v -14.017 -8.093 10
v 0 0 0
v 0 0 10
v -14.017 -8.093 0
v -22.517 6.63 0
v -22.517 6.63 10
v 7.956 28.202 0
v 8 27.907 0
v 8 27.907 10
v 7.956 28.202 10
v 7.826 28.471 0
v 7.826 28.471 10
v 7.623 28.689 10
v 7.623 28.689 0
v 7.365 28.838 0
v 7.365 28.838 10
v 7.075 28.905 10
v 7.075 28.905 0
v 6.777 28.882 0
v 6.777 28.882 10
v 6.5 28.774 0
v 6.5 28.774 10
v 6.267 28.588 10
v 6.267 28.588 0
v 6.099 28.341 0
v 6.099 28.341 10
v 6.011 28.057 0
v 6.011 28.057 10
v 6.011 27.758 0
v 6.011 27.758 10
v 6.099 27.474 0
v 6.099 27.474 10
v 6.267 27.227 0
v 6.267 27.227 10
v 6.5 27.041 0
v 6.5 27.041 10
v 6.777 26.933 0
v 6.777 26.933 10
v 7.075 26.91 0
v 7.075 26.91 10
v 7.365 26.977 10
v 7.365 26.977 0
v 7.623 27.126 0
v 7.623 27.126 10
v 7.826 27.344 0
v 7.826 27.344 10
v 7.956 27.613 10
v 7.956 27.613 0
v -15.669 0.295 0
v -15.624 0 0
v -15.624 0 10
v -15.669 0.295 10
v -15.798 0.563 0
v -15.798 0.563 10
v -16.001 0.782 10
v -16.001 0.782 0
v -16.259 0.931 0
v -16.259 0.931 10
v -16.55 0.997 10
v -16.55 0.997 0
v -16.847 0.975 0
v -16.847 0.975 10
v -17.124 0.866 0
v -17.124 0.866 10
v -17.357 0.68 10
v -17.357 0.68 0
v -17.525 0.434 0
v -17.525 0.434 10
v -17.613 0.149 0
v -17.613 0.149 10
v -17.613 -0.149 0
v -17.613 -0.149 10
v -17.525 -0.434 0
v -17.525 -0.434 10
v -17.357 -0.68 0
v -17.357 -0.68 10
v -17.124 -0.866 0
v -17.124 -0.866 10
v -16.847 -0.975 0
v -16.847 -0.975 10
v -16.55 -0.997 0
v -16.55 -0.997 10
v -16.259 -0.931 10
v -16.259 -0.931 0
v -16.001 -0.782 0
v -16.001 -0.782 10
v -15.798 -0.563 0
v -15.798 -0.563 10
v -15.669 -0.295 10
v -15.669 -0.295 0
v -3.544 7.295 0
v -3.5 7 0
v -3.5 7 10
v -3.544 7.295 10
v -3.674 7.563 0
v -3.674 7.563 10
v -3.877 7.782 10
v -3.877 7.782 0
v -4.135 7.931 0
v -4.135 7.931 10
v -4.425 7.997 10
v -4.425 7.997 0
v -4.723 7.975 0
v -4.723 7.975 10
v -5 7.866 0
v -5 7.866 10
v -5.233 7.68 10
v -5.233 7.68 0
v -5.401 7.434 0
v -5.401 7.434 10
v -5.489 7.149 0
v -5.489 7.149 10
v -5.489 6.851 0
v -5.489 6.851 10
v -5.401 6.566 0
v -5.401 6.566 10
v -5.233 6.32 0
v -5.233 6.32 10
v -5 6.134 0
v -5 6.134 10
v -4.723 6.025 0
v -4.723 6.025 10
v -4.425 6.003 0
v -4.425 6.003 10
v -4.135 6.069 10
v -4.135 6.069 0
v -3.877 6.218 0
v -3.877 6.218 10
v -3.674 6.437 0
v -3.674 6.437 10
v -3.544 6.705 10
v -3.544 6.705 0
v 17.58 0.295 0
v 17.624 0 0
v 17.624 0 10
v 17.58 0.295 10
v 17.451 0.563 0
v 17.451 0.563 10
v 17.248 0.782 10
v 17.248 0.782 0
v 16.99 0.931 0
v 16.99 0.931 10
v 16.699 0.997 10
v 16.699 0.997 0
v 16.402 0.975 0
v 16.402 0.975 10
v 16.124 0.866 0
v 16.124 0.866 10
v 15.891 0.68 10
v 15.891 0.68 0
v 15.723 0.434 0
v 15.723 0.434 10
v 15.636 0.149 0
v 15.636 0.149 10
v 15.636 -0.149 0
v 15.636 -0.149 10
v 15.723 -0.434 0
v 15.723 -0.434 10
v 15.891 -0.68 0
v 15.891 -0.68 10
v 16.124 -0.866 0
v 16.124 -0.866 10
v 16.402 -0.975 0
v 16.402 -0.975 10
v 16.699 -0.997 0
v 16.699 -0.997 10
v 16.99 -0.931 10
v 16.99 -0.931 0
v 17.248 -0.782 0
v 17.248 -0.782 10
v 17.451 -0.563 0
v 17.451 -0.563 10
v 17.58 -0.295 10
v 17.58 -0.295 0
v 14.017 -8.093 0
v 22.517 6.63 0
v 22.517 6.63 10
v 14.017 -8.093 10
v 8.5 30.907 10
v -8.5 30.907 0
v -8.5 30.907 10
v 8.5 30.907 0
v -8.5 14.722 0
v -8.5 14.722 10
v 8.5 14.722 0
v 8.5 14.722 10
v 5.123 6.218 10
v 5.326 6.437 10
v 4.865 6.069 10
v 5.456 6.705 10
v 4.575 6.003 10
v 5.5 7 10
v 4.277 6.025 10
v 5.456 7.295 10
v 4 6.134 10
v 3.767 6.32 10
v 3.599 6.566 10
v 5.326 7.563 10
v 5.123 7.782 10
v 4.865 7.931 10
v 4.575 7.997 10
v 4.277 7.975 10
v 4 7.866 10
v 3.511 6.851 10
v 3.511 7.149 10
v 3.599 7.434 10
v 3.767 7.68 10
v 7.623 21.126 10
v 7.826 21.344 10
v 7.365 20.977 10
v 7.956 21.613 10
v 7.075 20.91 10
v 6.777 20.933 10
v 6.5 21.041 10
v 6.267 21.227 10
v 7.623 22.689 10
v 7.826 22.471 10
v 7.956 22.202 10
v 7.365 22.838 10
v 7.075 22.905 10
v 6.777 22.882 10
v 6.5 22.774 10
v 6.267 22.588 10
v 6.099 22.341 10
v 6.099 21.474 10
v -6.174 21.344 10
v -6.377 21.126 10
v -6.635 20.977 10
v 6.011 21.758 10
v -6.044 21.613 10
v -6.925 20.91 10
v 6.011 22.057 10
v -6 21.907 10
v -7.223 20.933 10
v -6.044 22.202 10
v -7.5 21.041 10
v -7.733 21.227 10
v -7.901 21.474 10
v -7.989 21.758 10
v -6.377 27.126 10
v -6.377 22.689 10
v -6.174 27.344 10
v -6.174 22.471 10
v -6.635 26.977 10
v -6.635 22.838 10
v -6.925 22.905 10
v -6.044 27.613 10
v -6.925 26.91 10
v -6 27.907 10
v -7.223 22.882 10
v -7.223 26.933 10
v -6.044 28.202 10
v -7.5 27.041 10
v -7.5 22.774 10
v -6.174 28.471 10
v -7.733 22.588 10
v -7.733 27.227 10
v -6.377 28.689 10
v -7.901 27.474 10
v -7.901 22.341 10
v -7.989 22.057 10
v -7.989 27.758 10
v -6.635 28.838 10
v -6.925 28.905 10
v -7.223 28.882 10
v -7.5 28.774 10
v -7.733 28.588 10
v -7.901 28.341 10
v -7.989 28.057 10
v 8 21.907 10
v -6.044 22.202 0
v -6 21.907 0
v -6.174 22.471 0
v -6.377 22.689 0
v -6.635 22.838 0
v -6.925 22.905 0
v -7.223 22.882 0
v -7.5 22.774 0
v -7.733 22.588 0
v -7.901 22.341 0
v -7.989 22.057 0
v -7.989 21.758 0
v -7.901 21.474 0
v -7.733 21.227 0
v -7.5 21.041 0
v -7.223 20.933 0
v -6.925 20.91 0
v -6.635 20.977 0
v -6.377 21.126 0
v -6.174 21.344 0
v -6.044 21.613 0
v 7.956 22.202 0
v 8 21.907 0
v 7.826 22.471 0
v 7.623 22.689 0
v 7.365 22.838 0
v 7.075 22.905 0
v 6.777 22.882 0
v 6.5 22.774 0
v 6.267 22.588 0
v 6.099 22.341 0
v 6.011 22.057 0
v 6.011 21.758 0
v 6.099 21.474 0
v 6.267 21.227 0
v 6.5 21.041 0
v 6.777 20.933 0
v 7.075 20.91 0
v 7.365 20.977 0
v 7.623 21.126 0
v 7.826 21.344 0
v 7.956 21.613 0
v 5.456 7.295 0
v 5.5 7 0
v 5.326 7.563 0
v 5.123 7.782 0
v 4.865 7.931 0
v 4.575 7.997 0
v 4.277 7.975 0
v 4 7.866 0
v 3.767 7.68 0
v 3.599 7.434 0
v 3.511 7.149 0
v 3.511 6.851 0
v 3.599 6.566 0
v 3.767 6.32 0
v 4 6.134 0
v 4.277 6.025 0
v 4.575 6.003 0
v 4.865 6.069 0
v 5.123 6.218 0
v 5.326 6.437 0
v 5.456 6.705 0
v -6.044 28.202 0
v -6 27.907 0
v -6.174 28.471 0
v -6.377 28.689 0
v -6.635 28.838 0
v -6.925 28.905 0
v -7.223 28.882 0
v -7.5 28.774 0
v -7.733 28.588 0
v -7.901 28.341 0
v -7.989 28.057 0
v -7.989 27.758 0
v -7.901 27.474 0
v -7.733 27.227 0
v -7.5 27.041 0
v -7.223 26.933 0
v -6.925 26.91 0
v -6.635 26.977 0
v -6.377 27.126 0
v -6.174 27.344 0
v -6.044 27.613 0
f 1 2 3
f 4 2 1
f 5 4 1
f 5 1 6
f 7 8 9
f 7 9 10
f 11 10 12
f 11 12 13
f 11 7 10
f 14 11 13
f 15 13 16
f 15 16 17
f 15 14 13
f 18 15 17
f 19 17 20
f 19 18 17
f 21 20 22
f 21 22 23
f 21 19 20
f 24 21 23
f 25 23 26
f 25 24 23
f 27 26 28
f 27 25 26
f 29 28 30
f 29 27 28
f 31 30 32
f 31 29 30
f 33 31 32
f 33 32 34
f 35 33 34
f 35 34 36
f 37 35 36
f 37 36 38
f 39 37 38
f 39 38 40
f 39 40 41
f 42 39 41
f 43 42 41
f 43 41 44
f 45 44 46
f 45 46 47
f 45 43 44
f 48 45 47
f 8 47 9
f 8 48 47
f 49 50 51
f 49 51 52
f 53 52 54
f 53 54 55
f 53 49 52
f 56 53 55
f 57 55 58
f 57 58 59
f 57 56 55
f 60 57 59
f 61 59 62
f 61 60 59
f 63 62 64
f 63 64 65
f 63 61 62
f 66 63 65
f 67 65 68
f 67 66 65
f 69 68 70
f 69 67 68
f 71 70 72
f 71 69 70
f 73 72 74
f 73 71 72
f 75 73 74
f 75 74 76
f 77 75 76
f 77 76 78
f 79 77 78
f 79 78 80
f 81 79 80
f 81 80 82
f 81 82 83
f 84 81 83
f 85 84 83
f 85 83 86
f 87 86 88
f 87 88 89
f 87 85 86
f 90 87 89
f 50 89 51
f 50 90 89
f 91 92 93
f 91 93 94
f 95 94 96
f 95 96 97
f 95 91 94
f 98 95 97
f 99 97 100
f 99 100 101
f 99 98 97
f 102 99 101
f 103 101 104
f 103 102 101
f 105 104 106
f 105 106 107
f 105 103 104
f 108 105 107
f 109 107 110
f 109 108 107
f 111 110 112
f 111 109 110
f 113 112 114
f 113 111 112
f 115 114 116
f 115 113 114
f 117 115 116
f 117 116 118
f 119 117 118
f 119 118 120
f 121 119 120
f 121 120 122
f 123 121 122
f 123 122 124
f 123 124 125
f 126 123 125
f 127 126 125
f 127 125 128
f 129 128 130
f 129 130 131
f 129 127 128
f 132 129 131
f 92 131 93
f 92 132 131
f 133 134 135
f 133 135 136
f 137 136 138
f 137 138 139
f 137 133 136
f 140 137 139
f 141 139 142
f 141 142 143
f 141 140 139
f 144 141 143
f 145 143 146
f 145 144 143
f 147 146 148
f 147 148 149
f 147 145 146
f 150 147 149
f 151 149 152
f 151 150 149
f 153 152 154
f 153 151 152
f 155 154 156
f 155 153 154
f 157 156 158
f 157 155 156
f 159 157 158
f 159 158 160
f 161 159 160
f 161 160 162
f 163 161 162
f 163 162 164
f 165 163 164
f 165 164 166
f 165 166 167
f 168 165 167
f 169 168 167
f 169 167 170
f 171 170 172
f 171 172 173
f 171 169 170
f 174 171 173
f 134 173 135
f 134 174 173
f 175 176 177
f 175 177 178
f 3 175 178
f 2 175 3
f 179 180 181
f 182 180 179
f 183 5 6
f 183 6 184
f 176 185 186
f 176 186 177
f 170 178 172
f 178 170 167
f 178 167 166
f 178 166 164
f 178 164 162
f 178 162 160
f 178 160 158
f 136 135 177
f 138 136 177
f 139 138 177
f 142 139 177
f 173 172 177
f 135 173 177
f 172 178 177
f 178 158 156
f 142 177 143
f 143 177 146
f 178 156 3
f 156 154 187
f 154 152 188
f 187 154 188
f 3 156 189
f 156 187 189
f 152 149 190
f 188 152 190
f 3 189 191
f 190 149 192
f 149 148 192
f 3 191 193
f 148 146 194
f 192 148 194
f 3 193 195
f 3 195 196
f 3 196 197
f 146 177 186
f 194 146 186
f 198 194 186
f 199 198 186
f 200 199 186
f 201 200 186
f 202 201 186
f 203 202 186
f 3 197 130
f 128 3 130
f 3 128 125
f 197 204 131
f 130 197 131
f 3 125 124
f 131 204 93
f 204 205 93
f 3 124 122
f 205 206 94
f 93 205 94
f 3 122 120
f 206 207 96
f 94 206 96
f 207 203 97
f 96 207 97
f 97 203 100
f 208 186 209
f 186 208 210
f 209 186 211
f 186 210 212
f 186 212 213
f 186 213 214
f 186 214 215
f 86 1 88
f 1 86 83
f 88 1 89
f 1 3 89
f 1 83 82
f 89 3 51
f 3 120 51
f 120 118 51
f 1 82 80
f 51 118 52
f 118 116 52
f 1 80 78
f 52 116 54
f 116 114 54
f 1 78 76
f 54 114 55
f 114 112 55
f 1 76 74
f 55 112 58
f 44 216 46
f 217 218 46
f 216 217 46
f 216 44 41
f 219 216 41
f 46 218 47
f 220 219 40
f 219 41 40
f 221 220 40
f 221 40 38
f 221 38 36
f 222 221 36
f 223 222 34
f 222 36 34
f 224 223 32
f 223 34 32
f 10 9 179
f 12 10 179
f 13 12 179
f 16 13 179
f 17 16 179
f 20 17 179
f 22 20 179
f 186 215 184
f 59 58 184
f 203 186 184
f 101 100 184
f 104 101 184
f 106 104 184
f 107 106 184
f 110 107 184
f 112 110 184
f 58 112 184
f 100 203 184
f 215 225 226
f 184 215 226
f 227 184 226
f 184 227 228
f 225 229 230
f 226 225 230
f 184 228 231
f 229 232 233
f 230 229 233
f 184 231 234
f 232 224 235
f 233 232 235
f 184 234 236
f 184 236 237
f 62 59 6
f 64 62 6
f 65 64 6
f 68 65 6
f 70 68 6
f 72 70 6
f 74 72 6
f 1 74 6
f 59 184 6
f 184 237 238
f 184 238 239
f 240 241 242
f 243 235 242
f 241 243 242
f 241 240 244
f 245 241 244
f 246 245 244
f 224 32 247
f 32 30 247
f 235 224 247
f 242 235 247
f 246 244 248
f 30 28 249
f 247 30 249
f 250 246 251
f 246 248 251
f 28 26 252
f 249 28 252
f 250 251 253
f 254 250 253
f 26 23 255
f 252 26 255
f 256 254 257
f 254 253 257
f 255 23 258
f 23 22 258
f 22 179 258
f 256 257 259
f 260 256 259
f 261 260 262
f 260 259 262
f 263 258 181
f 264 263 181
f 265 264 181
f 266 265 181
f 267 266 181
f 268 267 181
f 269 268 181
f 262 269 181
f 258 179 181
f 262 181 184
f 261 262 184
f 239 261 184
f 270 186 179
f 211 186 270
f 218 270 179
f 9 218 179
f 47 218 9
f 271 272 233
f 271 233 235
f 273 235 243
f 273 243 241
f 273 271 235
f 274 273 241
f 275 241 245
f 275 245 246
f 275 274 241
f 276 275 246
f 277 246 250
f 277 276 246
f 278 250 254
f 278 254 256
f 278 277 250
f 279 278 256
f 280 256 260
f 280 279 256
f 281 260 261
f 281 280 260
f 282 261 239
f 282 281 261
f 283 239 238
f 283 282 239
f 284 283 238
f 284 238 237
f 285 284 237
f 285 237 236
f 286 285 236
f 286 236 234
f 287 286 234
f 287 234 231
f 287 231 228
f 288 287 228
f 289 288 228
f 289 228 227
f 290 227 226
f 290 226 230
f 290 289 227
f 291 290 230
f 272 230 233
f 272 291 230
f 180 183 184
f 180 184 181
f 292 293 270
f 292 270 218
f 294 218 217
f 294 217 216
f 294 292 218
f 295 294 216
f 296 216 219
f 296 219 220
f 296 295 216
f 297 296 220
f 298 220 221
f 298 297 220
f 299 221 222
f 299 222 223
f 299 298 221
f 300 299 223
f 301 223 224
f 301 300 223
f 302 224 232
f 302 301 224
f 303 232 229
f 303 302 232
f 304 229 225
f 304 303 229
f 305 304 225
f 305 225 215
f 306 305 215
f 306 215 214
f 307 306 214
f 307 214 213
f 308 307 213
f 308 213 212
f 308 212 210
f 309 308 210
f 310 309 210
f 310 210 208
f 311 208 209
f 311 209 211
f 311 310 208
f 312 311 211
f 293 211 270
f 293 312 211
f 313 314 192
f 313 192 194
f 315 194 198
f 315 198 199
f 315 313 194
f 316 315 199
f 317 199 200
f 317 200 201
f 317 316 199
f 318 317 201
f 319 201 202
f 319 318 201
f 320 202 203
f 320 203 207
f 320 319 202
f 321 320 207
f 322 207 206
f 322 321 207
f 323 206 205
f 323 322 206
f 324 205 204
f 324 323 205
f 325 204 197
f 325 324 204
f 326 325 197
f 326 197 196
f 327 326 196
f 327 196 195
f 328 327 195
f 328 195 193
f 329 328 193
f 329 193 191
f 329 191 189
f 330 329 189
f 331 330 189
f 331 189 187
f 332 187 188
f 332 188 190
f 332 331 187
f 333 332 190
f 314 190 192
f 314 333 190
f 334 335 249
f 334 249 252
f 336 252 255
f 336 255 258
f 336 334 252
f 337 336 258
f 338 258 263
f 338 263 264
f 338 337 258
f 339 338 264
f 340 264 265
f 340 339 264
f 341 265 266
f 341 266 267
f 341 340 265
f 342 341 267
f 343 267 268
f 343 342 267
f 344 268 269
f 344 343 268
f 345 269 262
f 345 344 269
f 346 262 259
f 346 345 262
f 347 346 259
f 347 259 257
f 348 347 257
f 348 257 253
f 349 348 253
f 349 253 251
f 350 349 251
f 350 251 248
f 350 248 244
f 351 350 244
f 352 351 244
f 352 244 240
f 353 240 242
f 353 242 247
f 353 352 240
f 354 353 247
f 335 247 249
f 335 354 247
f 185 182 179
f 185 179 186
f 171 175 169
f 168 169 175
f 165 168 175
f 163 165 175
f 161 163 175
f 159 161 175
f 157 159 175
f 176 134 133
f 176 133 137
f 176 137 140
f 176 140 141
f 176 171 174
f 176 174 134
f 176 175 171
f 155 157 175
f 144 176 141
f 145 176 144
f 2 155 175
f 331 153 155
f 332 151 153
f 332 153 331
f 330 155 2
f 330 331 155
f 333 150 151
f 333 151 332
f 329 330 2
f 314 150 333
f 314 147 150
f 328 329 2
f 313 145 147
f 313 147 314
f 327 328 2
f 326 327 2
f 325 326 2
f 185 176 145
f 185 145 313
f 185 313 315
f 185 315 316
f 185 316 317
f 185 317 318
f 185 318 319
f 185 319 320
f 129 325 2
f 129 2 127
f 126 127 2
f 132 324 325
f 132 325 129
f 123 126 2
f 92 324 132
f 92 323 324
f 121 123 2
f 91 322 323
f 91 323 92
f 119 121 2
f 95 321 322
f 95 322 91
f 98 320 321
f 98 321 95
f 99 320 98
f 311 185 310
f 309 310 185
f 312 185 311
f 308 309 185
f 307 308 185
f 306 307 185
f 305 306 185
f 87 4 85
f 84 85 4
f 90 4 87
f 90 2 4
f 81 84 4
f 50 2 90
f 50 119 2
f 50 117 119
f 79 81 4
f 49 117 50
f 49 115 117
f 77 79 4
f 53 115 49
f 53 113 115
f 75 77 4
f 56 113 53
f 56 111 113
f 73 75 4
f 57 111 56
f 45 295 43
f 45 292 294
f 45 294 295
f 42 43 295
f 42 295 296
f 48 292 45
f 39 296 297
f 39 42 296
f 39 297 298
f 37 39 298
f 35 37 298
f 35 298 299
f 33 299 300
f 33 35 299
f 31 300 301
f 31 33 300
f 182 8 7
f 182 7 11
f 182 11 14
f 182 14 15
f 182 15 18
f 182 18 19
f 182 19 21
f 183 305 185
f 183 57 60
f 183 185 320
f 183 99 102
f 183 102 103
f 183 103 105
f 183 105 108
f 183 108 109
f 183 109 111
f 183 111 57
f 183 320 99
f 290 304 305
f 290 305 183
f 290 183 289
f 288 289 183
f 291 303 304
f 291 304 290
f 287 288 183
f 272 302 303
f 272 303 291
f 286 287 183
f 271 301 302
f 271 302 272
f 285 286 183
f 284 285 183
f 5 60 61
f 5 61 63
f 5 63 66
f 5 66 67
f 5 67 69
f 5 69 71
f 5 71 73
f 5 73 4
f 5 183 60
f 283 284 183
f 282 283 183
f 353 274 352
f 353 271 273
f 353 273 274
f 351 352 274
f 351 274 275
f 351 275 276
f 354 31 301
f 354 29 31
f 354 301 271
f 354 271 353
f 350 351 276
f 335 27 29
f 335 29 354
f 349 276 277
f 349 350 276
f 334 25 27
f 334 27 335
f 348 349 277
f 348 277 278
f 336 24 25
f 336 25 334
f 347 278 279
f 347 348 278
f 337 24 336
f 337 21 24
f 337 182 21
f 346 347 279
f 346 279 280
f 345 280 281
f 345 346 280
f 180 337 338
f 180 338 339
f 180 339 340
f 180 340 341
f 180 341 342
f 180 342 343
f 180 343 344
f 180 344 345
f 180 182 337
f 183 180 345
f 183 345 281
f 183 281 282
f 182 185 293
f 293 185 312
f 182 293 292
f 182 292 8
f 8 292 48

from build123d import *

# Parameters (mm, degrees)
SKETCH1_R           = 1
BOSS_EXTRUDE1_DEPTH = 10


with BuildPart() as part:
    # Sketch1 → Boss-Extrude1 (new body)
    with BuildSketch(Plane.XY):
        Polygon((-8.5, 14.722431864), (-8.5, 30.907477288), (8.5, 30.907477288), (8.5, 14.722431864), (22.516660498, 6.629909152), (14.016660498, -8.092522712), (0, 0), (-14.016660498, -8.092522712), (-22.516660498, 6.629909152), align=None)
        with Locations((-7, 27.907477288)):
            Circle(SKETCH1_R, mode=Mode.SUBTRACT)
        with Locations((7, 27.907477288)):
            Circle(SKETCH1_R, mode=Mode.SUBTRACT)
        with Locations((-7, 21.907477288)):
            Circle(SKETCH1_R, mode=Mode.SUBTRACT)
        with Locations((7, 21.907477288)):
            Circle(SKETCH1_R, mode=Mode.SUBTRACT)
        with Locations((-16.624355653, 0)):
            Circle(SKETCH1_R, mode=Mode.SUBTRACT)
        with Locations((-4.5, 7)):
            Circle(SKETCH1_R, mode=Mode.SUBTRACT)
        with Locations((4.5, 7)):
            Circle(SKETCH1_R, mode=Mode.SUBTRACT)
        with Locations((16.624355653, 0)):
            Circle(SKETCH1_R, mode=Mode.SUBTRACT)
    extrude(amount=BOSS_EXTRUDE1_DEPTH)


solid = part.part
